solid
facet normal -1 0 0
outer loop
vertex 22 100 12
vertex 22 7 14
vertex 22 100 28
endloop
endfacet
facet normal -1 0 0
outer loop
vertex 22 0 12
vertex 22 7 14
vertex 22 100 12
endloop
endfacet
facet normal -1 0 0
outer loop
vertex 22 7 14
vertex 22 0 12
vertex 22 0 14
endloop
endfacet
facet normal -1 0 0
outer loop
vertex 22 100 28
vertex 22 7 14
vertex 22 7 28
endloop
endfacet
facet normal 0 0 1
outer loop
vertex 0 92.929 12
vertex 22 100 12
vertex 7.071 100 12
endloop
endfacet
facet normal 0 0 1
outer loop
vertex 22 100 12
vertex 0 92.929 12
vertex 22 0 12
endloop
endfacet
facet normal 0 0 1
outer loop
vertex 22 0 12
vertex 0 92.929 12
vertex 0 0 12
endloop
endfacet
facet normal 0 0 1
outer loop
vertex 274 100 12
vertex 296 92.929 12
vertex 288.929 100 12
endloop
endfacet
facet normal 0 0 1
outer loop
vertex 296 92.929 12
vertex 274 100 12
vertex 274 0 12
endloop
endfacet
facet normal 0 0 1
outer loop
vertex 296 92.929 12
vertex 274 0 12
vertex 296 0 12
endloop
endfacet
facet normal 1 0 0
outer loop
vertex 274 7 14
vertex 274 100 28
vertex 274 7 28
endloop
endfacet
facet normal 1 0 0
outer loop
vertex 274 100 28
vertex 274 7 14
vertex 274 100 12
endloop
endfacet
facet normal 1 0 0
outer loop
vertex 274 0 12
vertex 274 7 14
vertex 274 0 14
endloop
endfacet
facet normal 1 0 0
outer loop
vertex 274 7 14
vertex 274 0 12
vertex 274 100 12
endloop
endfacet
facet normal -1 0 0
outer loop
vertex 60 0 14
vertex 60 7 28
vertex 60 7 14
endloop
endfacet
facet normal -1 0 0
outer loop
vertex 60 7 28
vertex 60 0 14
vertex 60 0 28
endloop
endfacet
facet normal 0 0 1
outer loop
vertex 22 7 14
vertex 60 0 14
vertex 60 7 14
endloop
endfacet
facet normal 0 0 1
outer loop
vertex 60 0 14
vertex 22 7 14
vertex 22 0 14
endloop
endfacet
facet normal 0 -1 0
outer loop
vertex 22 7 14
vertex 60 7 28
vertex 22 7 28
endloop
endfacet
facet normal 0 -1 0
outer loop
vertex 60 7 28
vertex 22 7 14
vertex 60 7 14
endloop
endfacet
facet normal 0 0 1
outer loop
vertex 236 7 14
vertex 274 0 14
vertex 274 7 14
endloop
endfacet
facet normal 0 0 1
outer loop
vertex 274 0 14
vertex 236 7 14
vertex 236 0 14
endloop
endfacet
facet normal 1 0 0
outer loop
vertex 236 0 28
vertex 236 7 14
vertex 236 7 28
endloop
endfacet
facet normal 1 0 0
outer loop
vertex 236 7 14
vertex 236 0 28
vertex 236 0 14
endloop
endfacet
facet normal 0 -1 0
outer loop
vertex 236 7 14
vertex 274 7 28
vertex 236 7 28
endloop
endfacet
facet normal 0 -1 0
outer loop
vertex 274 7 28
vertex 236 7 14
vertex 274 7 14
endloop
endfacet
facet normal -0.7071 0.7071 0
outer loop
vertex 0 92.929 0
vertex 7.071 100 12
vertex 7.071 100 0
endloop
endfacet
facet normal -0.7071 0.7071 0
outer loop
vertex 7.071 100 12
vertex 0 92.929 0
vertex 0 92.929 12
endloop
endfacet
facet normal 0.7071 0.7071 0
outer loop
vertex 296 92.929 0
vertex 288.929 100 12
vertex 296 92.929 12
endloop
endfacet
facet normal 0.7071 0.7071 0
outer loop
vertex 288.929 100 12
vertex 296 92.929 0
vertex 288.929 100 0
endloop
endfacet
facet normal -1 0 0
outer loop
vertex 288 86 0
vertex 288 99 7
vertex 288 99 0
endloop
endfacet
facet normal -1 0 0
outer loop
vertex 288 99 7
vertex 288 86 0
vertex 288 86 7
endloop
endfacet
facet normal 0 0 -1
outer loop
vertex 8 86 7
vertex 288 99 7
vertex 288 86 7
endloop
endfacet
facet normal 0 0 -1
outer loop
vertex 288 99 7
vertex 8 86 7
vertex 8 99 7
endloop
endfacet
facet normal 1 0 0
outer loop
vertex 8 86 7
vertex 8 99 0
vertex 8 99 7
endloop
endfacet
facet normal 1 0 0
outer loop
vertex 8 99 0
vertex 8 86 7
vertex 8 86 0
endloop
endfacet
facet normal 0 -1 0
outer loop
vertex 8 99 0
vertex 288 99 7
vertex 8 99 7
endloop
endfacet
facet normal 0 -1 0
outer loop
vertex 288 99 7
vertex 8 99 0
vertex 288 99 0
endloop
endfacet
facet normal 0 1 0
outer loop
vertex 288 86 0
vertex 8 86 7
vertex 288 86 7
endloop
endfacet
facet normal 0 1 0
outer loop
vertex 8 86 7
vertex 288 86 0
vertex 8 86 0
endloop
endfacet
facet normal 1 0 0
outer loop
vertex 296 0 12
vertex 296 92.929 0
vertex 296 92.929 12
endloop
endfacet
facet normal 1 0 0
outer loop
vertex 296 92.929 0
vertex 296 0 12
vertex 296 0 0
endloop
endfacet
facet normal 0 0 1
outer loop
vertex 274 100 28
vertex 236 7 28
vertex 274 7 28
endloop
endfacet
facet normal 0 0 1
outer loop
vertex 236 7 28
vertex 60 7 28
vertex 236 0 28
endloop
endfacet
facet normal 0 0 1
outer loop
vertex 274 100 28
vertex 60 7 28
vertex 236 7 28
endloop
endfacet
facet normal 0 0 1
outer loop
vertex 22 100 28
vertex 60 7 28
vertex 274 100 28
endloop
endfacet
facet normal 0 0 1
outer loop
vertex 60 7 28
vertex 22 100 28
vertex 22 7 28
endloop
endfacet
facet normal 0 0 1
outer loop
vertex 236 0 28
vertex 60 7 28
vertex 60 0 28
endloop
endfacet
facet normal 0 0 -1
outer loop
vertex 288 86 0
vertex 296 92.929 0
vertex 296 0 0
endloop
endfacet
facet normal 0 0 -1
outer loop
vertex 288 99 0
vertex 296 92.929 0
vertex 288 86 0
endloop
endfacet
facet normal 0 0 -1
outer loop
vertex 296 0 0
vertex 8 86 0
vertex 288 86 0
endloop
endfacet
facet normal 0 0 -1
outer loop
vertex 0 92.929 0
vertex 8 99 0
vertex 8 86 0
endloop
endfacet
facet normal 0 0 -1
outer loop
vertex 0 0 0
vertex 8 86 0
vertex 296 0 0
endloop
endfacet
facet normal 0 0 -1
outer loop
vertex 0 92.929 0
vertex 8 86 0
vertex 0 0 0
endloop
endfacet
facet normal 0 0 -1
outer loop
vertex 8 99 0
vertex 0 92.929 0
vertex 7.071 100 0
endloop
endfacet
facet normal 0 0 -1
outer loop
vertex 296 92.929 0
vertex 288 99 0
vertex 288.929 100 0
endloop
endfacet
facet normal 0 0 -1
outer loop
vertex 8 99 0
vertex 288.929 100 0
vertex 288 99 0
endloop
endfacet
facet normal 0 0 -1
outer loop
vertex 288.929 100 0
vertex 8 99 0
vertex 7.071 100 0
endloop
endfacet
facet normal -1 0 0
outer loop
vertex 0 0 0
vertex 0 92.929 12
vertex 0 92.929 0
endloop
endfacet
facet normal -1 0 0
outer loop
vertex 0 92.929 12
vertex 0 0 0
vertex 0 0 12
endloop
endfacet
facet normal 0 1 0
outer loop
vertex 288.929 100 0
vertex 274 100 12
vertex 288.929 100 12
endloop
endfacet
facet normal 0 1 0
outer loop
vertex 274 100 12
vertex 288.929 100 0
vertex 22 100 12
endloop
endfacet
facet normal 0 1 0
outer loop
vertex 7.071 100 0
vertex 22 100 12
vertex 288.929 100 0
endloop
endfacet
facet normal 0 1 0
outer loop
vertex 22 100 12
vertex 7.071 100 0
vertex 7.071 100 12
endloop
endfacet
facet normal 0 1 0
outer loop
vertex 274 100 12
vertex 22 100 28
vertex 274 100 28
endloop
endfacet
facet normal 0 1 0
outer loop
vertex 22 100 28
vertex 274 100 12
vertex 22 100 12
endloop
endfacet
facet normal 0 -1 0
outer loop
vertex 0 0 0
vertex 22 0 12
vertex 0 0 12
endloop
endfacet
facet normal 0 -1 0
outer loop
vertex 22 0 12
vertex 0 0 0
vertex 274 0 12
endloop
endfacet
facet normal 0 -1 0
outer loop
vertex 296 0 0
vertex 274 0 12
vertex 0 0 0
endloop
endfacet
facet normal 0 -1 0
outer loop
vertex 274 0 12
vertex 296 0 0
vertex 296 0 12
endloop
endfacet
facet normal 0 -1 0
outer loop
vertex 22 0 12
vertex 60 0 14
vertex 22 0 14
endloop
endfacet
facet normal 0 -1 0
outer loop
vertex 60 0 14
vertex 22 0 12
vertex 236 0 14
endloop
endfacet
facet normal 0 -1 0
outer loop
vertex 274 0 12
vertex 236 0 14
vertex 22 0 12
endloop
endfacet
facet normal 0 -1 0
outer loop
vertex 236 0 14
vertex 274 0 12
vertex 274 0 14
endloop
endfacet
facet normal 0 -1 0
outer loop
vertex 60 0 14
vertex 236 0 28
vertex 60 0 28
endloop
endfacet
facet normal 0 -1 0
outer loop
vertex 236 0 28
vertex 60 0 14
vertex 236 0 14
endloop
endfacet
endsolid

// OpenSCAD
include <../src/wardrobe.scad>;
plank_yx_side_top();
//github_openscad -o wardrobe_1/plank_yx_side_top.stl -D wardrobe_n=1 -D cutting_edge=0 -D break_view_length=0 wardrobe_1/plank_yx_side_top_stl.scad
